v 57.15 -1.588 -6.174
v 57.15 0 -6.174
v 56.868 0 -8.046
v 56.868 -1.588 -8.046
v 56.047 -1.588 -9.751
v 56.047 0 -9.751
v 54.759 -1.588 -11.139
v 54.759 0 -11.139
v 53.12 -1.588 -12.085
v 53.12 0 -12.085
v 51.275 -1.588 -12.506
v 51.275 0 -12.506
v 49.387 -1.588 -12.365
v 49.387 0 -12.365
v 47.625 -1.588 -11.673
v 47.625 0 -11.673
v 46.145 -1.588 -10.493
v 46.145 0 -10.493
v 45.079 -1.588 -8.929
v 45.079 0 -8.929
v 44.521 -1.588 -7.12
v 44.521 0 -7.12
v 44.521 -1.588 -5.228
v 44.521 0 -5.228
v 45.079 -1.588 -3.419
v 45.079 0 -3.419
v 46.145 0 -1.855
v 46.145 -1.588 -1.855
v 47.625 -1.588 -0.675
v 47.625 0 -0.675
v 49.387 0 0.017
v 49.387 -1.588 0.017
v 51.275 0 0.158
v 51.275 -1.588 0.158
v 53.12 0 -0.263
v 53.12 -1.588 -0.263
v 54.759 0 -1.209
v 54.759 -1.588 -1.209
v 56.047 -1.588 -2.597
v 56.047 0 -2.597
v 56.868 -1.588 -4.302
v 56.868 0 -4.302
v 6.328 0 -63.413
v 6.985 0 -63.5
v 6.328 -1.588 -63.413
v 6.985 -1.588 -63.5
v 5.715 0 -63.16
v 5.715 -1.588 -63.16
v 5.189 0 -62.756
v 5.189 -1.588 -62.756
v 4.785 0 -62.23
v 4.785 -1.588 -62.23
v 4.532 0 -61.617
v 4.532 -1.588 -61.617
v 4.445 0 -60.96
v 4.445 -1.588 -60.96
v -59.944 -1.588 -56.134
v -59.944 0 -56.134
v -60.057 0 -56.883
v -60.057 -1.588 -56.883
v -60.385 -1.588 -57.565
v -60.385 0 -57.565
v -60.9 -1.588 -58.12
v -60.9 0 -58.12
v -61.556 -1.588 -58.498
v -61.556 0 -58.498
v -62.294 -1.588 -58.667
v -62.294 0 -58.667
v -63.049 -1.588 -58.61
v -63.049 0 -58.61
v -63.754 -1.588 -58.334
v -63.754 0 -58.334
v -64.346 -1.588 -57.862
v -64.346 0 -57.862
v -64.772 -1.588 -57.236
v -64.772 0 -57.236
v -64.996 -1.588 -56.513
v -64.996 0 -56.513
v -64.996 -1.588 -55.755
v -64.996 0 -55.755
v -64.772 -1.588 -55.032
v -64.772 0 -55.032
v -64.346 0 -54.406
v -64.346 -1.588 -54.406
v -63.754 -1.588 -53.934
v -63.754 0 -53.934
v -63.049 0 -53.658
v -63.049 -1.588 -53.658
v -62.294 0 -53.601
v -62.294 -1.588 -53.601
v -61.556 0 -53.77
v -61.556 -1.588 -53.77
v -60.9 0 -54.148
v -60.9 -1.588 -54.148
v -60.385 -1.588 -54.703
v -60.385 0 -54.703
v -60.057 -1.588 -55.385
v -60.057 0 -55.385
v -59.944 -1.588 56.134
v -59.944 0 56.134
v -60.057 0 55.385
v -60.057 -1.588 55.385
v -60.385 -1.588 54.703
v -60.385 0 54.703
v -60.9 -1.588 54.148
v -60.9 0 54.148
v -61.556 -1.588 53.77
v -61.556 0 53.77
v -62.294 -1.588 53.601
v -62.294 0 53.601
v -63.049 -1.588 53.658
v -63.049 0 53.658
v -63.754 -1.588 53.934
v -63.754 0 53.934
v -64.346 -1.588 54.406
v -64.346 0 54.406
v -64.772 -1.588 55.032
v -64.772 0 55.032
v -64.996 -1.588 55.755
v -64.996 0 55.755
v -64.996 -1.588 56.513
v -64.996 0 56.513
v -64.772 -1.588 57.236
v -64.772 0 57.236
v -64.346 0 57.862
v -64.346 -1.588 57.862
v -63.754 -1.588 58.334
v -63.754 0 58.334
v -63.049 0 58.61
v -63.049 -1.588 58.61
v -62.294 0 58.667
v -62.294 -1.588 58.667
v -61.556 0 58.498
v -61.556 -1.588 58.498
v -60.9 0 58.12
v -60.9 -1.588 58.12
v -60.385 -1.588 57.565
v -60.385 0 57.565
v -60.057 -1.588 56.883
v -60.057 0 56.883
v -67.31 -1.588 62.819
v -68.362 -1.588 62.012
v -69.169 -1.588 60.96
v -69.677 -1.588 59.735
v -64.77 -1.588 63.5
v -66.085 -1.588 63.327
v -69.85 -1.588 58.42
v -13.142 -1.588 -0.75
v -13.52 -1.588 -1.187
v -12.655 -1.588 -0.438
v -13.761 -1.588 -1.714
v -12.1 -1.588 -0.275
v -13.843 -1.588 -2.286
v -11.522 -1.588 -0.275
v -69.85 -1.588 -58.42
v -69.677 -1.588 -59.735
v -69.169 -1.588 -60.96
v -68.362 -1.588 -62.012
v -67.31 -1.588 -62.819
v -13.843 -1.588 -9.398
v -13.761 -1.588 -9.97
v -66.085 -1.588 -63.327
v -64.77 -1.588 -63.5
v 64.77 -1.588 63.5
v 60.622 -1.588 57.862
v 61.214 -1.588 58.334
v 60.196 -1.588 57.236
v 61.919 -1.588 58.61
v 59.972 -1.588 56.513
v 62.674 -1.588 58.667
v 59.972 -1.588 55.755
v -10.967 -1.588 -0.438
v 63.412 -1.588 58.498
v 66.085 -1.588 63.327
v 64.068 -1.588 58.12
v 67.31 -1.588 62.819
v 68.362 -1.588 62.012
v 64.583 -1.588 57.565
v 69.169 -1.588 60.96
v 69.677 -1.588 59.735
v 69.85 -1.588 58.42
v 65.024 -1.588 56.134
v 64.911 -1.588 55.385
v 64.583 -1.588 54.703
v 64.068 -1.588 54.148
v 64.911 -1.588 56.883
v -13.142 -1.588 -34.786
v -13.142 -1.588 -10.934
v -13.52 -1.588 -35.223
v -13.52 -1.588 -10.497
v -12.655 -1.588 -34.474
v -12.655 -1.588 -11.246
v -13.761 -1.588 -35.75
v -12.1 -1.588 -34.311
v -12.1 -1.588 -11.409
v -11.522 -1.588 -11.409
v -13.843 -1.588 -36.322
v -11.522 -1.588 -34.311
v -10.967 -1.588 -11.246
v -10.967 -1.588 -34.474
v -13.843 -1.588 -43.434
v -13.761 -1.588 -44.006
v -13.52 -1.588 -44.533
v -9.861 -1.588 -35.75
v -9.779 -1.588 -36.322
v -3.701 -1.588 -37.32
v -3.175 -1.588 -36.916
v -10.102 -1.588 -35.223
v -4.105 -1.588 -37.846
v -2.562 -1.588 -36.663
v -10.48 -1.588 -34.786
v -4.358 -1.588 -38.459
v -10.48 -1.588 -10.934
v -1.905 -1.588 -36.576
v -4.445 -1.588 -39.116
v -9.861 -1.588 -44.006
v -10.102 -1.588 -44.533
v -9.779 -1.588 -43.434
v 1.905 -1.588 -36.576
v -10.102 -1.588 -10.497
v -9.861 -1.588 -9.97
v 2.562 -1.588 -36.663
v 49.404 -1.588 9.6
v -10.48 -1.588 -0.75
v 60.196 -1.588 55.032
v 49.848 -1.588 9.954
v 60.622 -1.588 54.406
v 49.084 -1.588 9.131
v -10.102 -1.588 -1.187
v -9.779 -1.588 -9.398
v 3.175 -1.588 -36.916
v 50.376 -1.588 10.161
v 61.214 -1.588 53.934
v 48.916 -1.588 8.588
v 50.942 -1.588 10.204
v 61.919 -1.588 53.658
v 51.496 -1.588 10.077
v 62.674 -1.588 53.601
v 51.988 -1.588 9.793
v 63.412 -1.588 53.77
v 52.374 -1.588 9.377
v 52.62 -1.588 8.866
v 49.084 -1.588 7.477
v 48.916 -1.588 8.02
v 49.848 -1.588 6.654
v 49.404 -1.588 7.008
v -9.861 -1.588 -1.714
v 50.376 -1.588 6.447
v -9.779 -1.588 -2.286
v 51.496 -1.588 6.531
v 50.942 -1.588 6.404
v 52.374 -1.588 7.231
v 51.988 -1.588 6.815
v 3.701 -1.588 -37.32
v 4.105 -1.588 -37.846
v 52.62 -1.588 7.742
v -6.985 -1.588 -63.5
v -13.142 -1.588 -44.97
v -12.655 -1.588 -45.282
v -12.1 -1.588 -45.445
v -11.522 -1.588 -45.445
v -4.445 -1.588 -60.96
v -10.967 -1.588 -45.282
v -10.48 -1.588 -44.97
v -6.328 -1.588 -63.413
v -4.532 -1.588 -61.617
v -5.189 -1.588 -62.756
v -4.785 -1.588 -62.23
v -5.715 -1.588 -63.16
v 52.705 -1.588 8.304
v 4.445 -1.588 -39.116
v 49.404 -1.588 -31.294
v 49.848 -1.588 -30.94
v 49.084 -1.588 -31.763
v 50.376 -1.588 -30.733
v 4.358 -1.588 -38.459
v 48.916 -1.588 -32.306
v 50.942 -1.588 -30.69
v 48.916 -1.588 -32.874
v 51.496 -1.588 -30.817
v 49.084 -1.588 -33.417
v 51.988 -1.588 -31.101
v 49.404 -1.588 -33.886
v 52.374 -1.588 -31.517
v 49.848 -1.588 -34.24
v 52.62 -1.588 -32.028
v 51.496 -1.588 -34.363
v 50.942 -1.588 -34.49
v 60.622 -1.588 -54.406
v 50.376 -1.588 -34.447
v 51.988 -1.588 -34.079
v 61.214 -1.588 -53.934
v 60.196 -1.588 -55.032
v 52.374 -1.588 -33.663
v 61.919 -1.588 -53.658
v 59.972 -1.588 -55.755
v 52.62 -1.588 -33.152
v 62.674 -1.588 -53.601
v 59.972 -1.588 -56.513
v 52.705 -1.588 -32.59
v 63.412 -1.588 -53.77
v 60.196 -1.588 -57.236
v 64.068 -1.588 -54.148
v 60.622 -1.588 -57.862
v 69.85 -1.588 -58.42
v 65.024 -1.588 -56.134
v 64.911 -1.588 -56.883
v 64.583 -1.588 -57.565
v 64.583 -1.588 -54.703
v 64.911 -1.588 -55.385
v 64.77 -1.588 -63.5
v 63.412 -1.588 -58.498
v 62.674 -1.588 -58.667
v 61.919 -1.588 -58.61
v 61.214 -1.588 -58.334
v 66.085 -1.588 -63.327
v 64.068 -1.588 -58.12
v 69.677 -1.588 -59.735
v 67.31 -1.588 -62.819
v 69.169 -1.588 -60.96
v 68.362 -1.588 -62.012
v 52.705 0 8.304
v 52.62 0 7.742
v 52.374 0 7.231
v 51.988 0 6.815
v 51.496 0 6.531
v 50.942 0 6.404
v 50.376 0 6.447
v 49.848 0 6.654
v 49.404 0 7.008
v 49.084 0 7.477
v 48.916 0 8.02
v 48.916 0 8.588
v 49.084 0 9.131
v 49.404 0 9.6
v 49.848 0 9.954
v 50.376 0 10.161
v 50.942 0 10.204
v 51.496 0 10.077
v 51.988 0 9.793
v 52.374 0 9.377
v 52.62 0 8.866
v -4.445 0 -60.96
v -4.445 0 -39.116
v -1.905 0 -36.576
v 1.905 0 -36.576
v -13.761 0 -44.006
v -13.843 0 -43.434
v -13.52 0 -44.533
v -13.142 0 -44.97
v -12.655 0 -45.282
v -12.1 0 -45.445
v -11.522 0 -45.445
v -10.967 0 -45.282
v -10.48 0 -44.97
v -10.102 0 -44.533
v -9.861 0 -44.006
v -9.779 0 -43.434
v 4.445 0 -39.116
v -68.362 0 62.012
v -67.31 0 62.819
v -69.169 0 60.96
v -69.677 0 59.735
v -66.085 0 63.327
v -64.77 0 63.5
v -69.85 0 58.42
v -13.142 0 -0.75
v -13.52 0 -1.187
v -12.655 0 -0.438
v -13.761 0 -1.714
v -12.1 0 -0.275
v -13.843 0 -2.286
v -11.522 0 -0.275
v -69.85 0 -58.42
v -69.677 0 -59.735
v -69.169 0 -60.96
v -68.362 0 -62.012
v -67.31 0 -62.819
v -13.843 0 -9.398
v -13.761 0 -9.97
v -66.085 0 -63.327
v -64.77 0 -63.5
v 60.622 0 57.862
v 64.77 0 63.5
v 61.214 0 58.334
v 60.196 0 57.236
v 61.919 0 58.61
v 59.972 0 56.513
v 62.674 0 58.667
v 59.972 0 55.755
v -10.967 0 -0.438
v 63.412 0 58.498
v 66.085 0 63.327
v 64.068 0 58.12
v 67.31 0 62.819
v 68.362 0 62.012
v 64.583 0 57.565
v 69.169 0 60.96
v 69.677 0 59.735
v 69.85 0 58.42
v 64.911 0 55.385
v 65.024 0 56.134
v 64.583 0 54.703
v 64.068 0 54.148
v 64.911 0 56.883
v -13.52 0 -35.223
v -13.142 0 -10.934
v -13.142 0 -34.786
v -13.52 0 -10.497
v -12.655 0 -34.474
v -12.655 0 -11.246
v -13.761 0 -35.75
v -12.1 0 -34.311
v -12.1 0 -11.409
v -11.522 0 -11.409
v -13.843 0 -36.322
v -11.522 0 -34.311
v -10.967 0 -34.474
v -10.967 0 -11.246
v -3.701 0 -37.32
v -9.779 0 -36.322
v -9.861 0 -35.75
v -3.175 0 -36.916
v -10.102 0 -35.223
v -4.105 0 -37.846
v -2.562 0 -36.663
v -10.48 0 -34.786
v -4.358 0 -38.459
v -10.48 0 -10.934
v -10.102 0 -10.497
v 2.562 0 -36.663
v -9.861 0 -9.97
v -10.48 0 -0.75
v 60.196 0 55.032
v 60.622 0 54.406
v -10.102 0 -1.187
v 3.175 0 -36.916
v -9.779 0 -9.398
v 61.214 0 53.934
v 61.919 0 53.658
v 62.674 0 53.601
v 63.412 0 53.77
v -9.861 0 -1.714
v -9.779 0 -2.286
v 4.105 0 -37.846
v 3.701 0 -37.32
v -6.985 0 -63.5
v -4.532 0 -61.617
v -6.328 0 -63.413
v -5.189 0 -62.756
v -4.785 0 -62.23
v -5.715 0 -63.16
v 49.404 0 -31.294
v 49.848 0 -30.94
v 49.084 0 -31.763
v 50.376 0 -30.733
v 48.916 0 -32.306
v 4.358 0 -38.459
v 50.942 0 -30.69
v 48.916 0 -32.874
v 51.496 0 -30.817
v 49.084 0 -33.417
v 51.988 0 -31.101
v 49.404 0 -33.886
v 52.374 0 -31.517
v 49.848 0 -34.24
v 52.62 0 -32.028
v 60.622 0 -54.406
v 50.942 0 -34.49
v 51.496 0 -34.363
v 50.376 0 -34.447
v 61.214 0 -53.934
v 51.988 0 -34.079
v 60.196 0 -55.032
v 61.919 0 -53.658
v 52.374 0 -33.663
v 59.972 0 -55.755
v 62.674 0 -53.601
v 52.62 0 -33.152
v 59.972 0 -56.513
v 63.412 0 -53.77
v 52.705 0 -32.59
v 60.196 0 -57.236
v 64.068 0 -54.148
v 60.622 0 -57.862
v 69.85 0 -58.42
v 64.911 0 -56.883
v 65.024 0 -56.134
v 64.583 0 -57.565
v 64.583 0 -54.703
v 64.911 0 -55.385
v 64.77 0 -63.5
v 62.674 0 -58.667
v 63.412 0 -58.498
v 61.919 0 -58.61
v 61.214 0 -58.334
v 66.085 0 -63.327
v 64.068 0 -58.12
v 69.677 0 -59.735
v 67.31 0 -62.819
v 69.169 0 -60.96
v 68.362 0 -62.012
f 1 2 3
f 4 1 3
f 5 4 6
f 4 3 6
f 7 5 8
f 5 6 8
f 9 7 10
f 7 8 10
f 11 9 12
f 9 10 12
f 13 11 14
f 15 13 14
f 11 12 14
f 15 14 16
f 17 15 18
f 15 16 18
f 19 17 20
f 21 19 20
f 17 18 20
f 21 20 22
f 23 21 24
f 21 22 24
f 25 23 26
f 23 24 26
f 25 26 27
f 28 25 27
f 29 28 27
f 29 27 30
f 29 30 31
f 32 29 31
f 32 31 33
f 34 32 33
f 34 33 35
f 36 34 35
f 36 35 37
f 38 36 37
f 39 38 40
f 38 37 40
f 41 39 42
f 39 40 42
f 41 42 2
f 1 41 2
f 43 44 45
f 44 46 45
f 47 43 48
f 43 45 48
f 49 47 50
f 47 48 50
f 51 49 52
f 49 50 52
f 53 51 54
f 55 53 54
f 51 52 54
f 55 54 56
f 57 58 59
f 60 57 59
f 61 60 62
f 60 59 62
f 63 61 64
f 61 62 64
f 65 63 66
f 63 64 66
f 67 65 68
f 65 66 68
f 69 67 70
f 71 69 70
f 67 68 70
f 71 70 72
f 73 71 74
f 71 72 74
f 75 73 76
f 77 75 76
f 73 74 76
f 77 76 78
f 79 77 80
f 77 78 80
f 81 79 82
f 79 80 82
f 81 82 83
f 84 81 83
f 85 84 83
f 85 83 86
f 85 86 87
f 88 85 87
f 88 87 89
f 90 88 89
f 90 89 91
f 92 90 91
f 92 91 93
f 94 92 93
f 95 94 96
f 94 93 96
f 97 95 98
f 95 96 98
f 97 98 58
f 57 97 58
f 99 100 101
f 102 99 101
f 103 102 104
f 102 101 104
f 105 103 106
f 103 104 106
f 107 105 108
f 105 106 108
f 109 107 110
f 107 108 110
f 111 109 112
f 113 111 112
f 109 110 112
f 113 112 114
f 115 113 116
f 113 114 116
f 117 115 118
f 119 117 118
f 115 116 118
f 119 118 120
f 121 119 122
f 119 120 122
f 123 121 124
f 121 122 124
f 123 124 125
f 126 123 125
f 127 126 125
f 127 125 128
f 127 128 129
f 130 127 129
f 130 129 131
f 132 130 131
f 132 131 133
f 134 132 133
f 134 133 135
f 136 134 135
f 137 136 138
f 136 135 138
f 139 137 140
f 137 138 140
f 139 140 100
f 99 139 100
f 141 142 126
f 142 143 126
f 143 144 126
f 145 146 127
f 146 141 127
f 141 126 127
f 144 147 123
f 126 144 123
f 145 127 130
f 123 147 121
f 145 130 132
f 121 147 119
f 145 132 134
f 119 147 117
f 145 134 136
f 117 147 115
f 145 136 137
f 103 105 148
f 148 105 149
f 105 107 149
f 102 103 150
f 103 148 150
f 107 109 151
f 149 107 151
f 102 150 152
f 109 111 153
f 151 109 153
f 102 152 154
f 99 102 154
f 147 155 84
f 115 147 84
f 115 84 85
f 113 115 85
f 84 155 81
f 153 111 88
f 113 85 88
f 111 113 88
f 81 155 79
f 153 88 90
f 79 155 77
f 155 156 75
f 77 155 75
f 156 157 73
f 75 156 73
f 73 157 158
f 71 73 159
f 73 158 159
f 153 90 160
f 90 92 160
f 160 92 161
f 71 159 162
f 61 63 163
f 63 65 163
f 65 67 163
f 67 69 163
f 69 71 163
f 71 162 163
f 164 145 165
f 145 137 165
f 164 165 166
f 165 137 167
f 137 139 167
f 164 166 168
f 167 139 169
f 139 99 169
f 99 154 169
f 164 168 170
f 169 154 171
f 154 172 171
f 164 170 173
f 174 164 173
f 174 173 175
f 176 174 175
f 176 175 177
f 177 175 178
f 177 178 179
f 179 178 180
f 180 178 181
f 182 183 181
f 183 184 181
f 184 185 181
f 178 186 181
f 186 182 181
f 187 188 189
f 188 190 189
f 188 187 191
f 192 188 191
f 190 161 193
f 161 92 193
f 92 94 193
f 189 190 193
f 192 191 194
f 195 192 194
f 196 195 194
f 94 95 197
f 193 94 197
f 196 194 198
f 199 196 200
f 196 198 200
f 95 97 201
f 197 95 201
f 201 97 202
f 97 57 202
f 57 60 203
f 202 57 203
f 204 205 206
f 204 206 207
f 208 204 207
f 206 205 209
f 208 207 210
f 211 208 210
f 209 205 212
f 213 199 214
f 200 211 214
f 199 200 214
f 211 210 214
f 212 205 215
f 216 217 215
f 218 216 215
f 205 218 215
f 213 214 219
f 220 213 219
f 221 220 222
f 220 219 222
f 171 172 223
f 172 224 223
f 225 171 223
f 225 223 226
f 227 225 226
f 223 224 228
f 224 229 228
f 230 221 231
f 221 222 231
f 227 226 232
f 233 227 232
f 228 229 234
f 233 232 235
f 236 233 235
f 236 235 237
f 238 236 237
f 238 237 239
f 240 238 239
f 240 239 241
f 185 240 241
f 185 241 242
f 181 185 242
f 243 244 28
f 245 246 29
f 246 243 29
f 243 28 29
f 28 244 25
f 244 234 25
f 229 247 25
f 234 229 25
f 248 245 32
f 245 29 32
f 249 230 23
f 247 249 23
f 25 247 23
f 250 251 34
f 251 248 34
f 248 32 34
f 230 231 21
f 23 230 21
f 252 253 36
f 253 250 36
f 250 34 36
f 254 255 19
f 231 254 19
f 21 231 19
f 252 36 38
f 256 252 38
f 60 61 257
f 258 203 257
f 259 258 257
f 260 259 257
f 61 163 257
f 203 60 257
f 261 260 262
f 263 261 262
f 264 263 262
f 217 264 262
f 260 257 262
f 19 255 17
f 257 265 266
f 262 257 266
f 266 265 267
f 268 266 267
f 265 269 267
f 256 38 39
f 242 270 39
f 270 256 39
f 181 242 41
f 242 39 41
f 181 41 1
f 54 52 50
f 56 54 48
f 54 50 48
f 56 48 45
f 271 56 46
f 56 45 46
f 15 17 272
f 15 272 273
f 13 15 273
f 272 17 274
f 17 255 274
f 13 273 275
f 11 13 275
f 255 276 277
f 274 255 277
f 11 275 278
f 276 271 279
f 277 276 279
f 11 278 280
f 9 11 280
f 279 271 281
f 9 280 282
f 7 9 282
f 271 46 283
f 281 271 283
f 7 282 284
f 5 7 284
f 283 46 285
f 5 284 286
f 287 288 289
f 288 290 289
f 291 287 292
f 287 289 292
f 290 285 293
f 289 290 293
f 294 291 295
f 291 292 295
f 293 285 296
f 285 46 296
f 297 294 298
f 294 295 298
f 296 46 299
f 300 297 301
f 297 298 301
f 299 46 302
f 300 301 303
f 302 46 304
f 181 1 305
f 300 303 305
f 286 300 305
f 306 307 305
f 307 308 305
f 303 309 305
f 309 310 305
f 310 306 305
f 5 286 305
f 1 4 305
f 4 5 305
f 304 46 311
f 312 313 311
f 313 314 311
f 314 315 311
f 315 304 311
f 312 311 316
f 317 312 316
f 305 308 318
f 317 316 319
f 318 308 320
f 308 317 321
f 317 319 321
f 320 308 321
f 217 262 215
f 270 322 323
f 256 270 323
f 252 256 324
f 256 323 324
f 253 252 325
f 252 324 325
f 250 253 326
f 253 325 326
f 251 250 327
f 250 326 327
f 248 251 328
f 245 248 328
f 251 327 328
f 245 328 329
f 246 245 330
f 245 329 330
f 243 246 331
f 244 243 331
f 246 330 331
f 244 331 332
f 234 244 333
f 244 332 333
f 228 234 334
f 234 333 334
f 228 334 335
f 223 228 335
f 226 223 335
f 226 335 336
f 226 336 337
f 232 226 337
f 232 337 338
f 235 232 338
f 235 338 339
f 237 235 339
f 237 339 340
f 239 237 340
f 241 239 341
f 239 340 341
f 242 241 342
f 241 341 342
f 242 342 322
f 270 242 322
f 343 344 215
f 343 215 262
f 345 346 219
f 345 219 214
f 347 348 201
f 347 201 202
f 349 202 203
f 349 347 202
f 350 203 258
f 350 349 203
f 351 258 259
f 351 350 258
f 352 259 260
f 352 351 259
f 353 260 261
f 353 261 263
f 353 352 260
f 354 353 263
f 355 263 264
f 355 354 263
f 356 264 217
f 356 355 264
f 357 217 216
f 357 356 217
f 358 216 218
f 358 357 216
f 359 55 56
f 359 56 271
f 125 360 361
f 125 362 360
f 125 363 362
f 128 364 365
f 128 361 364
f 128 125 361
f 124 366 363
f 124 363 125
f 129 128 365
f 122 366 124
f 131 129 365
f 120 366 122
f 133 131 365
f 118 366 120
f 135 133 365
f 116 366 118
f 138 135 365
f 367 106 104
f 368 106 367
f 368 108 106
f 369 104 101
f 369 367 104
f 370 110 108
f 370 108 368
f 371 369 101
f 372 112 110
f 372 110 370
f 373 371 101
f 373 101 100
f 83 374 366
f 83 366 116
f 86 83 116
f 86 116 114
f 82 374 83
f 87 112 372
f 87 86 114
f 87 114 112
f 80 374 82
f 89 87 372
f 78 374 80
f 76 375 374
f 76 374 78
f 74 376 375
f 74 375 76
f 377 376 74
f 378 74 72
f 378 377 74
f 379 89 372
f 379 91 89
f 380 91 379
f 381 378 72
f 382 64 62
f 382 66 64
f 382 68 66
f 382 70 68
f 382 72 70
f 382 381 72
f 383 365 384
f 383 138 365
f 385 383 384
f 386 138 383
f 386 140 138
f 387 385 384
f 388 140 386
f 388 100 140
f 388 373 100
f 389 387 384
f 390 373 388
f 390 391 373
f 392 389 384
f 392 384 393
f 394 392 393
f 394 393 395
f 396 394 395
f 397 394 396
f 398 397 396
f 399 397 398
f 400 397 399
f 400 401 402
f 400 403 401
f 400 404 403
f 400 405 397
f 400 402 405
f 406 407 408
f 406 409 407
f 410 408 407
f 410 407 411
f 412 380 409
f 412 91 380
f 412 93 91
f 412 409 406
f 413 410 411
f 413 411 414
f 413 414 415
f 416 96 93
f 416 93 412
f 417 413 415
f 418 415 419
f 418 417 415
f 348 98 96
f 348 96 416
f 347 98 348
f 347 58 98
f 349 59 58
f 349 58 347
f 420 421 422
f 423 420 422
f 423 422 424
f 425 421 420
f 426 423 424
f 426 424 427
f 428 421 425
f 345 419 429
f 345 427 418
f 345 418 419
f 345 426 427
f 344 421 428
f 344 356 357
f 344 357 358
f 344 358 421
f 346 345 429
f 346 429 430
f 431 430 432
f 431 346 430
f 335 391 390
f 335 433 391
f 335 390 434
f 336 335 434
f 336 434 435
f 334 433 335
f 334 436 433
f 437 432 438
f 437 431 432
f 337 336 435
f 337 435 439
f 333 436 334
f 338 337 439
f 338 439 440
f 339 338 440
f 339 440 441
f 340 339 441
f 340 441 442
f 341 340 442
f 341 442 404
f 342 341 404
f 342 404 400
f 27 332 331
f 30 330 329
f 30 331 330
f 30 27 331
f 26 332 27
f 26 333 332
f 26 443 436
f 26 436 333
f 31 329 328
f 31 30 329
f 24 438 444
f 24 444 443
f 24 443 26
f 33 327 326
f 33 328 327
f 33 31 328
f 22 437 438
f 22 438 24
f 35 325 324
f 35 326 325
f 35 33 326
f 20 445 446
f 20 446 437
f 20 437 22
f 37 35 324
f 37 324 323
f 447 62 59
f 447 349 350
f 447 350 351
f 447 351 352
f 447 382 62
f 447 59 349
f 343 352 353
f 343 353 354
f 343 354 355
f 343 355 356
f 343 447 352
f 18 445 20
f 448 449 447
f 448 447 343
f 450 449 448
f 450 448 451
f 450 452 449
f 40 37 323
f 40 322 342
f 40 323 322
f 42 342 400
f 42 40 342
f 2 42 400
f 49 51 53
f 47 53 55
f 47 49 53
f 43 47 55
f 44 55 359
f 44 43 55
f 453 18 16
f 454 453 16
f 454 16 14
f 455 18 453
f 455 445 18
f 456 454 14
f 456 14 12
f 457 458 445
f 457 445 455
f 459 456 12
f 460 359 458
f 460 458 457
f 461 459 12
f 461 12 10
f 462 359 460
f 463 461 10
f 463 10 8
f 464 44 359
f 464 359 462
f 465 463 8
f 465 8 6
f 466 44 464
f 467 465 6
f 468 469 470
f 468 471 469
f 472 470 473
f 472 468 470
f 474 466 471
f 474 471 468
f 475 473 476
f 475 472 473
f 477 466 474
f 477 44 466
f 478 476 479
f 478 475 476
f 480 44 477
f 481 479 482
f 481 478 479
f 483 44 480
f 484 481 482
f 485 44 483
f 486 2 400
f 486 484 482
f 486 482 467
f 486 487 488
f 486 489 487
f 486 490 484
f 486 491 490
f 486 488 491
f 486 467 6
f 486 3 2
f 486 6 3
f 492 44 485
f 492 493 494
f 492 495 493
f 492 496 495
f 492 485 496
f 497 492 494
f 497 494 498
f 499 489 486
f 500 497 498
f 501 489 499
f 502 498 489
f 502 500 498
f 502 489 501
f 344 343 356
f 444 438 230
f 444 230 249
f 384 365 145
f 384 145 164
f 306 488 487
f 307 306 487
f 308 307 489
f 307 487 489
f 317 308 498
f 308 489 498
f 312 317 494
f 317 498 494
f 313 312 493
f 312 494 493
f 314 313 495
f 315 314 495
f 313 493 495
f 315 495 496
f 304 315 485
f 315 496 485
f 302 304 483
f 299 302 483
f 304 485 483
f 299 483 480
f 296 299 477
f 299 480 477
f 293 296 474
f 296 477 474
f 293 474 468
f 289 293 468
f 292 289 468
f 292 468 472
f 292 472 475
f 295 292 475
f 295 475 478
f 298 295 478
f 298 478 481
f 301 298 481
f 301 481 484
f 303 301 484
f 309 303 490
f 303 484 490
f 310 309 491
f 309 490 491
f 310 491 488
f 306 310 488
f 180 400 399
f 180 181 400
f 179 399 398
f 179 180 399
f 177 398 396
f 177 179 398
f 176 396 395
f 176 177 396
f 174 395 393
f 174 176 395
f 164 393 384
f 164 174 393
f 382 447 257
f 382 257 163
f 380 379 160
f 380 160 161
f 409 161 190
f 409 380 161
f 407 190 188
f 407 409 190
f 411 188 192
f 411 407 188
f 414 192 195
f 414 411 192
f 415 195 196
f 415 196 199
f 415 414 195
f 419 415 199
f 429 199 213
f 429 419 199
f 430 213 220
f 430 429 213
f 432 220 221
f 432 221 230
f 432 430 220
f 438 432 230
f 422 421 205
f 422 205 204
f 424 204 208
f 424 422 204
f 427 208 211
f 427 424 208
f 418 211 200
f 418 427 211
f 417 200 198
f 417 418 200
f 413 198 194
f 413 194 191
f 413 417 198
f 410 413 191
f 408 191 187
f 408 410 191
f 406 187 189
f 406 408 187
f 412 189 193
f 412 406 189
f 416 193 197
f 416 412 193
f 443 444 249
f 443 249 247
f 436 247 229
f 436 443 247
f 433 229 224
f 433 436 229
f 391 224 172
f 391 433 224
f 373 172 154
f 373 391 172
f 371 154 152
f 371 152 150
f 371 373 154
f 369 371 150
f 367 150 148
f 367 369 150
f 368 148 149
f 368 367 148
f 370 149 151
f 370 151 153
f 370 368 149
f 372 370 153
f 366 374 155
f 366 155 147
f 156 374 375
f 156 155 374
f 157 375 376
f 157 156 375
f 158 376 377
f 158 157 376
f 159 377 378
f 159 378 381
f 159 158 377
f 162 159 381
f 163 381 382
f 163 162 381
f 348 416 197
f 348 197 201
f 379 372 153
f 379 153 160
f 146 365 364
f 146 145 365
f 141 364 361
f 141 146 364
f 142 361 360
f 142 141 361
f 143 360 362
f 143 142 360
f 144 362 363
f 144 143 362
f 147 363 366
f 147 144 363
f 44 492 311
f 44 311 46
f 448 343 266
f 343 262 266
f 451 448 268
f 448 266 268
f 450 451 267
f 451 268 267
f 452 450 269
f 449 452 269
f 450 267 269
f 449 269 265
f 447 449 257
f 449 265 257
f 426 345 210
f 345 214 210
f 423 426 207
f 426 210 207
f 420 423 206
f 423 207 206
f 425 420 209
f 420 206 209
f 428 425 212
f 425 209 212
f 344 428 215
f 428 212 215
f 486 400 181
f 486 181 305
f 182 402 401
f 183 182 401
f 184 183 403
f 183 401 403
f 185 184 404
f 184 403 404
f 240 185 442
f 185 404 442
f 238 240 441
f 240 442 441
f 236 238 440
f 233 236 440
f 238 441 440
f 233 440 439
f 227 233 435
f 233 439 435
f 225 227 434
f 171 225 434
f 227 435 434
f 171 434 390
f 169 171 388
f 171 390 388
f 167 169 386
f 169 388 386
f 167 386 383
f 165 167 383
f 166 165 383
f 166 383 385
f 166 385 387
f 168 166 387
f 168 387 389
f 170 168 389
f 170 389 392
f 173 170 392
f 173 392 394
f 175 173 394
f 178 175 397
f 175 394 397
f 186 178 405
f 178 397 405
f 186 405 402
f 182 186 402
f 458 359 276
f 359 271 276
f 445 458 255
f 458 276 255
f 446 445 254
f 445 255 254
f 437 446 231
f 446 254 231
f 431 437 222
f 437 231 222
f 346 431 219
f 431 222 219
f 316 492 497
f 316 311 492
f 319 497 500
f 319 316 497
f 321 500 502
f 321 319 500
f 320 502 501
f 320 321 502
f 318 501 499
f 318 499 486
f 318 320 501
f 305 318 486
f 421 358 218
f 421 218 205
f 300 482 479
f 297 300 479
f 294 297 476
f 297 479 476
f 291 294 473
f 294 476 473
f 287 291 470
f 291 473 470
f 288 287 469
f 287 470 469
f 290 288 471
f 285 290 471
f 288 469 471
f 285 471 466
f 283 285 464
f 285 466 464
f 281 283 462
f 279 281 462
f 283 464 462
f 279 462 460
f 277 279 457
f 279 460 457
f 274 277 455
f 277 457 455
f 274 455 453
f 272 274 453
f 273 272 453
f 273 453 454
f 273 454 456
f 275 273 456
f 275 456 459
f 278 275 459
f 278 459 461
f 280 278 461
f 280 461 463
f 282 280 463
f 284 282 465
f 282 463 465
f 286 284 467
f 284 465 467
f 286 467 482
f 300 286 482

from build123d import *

# Parameters (mm, degrees)
SKETCH1_R           = 2.54
SKETCH1_R_2         = 1.905
SKETCH1_R_3         = 6.35
BOSS_EXTRUDE1_DEPTH = 1.5875
FILLET1_R           = 5.08
FILLET2_R           = 2.54


with BuildPart() as part:
    # Sketch1 → Boss-Extrude1 (new body)
    with BuildSketch(Plane(origin=(0, 0, 0), x_dir=(1, 0, 0), z_dir=(0, 1, 0))):
        Polygon((69.85, 63.5), (4.445, 63.5), (4.445, 36.576), (-4.445, 36.576), (-4.445, 63.5), (-69.85, 63.5), (-69.85, -63.5), (69.85, -63.5), align=None)
        with Locations((-62.484, 56.134)):
            Circle(SKETCH1_R, mode=Mode.SUBTRACT)
        with Locations((-62.484, -56.134)):
            Circle(SKETCH1_R, mode=Mode.SUBTRACT)
        with Locations((62.484, 56.134)):
            Circle(SKETCH1_R, mode=Mode.SUBTRACT)
        with Locations((62.484, -56.134)):
            Circle(SKETCH1_R, mode=Mode.SUBTRACT)
        with Locations((50.8, -8.304005887)):
            Circle(SKETCH1_R_2, mode=Mode.SUBTRACT)
        with Locations((50.8, 32.589994113)):
            Circle(SKETCH1_R_2, mode=Mode.SUBTRACT)
        with Locations((50.8, 6.173994113)):
            Circle(SKETCH1_R_3, mode=Mode.SUBTRACT)
        with BuildLine():
            Line((-9.779, 43.434), (-9.779, 36.322))
            ThreePointArc((-9.779, 36.322), (-11.811, 34.29), (-13.843, 36.322))
            Line((-13.843, 36.322), (-13.843, 43.434))
            ThreePointArc((-13.843, 43.434), (-11.811, 45.466), (-9.779, 43.434))
        make_face(mode=Mode.SUBTRACT)
        with BuildLine():
            Line((-9.779, 9.398), (-9.779, 2.286))
            ThreePointArc((-9.779, 2.286), (-11.811, 0.254), (-13.843, 2.286))
            Line((-13.843, 2.286), (-13.843, 9.398))
            ThreePointArc((-13.843, 9.398), (-11.811, 11.43), (-9.779, 9.398))
        make_face(mode=Mode.SUBTRACT)
    extrude(amount=-BOSS_EXTRUDE1_DEPTH)

    # Fillet1
    fillet1_edges = [part.edges().sort_by_distance(p)[0] for p in [
        (-69.85, -0.79375, -63.5),
        (69.85, -0.79375, -63.5),
        (69.85, -0.79375, 63.5),
        (-69.85, -0.79375, 63.5),
    ]]
    fillet(fillet1_edges, radius=FILLET1_R)

    # Fillet2
    fillet2_edges = [part.edges().sort_by_distance(p)[0] for p in [
        (-4.445, -0.79375, -63.5),
        (-4.445, -0.79375, -36.576),
        (4.445, -0.79375, -36.576),
        (4.445, -0.79375, -63.5),
    ]]
    fillet(fillet2_edges, radius=FILLET2_R)


solid = part.part
